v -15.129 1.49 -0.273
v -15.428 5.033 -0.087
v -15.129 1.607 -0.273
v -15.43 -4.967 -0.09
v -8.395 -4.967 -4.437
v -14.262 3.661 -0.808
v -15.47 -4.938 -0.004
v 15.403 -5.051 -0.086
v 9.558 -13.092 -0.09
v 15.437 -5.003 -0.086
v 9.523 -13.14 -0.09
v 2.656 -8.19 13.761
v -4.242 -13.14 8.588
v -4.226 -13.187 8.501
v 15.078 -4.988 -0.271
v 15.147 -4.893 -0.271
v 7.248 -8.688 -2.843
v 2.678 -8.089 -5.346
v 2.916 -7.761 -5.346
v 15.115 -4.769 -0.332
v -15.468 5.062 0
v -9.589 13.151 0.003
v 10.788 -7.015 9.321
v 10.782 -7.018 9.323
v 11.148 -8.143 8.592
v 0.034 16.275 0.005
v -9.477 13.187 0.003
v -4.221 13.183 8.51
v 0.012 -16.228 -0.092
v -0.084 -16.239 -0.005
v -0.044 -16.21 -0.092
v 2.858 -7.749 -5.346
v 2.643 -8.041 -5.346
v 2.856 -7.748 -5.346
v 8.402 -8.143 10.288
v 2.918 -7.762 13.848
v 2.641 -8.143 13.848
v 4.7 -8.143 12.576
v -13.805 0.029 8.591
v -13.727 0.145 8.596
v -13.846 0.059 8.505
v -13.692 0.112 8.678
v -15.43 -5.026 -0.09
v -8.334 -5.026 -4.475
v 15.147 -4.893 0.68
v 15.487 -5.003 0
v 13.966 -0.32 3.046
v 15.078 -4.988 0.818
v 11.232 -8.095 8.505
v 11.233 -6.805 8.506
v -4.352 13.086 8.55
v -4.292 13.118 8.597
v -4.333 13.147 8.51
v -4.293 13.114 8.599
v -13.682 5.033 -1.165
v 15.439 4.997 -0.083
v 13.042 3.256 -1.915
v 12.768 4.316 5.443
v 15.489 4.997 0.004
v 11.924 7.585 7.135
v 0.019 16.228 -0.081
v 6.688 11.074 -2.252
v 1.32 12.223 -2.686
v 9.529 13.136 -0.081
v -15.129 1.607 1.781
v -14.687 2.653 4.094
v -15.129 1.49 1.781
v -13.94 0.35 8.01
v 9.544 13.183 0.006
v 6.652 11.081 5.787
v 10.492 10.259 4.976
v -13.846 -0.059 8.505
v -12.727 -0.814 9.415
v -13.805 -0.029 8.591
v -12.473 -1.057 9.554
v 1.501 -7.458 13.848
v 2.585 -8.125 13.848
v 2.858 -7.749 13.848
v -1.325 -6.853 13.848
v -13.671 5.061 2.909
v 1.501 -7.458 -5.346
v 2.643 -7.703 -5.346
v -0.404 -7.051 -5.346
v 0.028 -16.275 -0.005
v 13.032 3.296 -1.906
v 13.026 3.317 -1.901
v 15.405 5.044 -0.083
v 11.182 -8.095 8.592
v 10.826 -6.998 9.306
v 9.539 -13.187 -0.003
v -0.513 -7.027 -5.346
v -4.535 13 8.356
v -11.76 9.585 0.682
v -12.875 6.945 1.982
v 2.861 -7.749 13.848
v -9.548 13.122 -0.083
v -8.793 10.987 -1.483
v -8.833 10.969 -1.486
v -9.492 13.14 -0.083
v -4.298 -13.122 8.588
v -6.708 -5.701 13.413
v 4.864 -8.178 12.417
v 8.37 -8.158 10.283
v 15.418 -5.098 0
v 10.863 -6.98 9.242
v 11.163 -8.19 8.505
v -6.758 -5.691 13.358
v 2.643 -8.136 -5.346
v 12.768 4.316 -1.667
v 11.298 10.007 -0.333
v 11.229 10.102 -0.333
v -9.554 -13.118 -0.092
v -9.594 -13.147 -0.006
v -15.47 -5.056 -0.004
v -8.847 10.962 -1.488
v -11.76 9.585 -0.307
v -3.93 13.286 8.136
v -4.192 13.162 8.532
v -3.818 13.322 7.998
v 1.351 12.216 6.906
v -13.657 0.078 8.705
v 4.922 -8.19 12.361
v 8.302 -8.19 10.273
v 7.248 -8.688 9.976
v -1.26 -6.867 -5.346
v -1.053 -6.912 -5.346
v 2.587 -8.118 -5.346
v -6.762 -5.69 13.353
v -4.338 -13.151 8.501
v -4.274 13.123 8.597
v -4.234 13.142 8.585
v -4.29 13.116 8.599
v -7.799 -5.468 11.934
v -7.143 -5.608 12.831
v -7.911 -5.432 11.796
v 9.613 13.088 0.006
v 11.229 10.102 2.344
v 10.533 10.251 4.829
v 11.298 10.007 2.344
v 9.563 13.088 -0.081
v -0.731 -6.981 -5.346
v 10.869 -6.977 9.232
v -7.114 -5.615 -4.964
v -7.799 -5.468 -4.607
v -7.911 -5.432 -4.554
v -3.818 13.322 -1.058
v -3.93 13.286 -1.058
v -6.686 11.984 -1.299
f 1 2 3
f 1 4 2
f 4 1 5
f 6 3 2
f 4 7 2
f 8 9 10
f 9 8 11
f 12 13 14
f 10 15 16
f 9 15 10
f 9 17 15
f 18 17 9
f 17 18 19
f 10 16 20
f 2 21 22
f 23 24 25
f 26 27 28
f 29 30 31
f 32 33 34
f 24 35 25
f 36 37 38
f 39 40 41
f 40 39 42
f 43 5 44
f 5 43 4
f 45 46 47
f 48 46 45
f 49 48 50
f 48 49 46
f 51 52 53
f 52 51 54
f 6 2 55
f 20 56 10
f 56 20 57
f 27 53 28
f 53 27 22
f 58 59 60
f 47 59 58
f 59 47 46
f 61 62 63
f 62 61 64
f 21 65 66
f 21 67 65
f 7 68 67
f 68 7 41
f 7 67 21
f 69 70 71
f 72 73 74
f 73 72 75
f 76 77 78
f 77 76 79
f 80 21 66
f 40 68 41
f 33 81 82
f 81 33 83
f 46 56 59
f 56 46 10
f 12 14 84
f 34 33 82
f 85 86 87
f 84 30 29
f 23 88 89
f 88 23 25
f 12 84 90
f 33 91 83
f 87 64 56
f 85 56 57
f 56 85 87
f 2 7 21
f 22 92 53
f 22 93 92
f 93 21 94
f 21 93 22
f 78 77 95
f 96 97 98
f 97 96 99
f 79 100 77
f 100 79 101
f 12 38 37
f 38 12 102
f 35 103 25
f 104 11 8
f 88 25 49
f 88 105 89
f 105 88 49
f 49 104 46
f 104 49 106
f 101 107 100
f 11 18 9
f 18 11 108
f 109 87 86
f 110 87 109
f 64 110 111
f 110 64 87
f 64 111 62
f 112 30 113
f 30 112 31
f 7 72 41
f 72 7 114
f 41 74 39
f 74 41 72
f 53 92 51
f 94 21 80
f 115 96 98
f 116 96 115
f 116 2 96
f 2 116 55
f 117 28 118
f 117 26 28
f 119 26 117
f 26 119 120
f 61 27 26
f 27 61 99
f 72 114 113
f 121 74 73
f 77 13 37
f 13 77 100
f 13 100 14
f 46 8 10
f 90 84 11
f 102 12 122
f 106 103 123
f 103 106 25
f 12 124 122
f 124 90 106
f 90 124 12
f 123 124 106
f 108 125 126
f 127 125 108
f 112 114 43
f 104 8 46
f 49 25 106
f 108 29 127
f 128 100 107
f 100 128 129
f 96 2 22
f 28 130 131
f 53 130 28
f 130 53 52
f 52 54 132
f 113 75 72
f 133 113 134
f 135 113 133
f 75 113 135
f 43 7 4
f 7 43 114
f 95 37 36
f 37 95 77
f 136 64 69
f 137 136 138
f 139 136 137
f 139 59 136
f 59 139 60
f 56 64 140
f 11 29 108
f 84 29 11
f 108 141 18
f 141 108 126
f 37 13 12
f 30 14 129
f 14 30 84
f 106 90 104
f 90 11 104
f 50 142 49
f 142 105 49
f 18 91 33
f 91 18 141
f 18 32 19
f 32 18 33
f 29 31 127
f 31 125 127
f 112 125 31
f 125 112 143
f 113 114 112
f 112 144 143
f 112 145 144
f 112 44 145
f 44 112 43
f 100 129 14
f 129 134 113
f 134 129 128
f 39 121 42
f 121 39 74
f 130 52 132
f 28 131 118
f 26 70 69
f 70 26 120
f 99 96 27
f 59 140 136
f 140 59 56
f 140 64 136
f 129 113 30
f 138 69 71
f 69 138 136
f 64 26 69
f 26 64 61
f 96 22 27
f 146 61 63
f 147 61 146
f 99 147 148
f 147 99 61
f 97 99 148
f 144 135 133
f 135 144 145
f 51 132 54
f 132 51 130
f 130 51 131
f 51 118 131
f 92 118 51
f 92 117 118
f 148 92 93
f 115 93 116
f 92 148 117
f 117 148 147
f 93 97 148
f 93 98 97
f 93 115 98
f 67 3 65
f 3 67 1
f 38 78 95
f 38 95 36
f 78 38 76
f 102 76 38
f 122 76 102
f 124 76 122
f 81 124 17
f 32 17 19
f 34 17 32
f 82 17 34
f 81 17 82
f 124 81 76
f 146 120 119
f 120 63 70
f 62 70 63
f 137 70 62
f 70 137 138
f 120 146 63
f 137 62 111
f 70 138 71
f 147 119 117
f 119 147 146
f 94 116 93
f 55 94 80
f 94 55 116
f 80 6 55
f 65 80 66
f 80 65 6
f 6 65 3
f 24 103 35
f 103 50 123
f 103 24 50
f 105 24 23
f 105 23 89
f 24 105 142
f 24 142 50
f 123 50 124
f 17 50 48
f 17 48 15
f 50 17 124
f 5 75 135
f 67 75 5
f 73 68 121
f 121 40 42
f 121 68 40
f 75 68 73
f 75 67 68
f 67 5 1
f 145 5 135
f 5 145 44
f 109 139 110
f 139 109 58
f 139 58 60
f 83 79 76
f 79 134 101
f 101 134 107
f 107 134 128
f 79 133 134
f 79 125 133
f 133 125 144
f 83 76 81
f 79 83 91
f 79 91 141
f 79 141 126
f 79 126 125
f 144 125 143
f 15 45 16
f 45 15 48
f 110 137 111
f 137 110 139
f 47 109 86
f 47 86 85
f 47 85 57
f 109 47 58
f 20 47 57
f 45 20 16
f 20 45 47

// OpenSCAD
// Auto-generated OpenSCAD file

    inner_points = 10*[[0.9299608274506113, -0.36625251042878015, 1.3090169944285586], [-0.9300308766981566, 0.03182392530465242, -1.3090169944285586], [1.266848278790813, 0.4315612808941218, -0.8090169942043599], [-0.38493553047389745, 1.3227137557713289, 0.5000000001356605], [-3.5024755881594054e-05, -0.16721429274351698, 1.618033988749895], [-1.5047999228086544, 0.15483630882503643, -0.5000000000867447], [1.5047298735611092, -0.48926489394916417, 0.5000000000867447], [-3.502449166371223e-05, -0.16721429238061072, -1.618033988749895], [1.2668482786587043, 0.43156128071266875, 0.809016994545535], [-0.2379166193940685, 0.753611882281222, -1.3090169942911047], [-0.9300308769119134, 0.03182392501105499, 1.3090169943213361], [-1.504799922890302, 0.15483630871289225, 0.4999999999132554], [1.5047298736427568, -0.48926489383702, -0.4999999999132554], [0.929960827664368, -0.3662525101351827, -1.3090169943213361], [1.1198293677926323, 1.0006631544963729, 2.224050943411271e-10], [0.5450603218142434, 1.12367553819821, -0.8090169941856757], [-0.23791661960782534, 0.7536118819876247, 1.3090169944587902], [-1.1679124716822094, 0.952650099854341, 3.023159500514794e-11], [0.5450603216821343, 1.123675538016757, 0.8090169945642192], [-0.38493553039224954, 1.3227137558834732, -0.4999999998643395], [-0.7830119659137325, -0.5372779485911959, 0.4999999998945711], [0.1469838862422994, -0.7363161663457679, 0.8090169943231298], [-0.7830119658320847, -0.5372779484790517, -0.500000000105429], [0.7217529323527971, -0.859328549866152, -1.86841930815973e-11], [0.14698388637440846, -0.7363161661643148, -0.8090169944267651]];

    outer_points = 10*[[0.0003389073222320645, 1.6180338602780315, 0.0005485303033235351], [-0.0003389073222320645, -1.6180338602780315, -0.0005485303033235351], [-1.376497554636943, 0.0, 0.8504636798996249], [0.8504636123728273, -0.0006447818753087883, 1.376497445343067], [0.9513306684223868, 1.3088176418818913, 0.0005730337122140106], [0.950782304855979, -1.309216138996162, -0.0003145069624228003], [-0.950782304855979, 1.309216138996162, 0.0003145069624228003], [-0.9513306684223868, -1.3088176418818913, -0.0005730337122140106], [-0.4251668862145562, 1.3088176418818913, 0.8510367136118389], [-0.42571524978096387, -1.309216138996162, 0.8501491729372022], [1.538946448725346, 0.4996775693623565, 0.00037865771973821793], [1.5387369924811702, -0.5003223512376653, 3.964734842487605e-05], [-1.5387369924811702, 0.5003223512376653, -3.964734842487605e-05], [-1.538946448725346, -0.4996775693623565, -0.00037865771973821793], [-0.688273380108343, 0.4996775693623565, 1.3764577979946422], [-0.6884828363525187, -0.5003223512376653, 1.3761187876233287], [1.1135701062666141, 0.808495290644226, 0.8510763609602638], [1.1132311989443822, -0.8095385696338055, 0.8505278306569404], [0.2628478320698681, 0.808495290644226, 1.3766918213355428], [0.26250892474763604, -0.8095385696338055, 1.3761432910322193], [0.8507222741967461, 0.0, -0.525615460375279], [0.2631064938937868, 0.8091400725195348, -0.5254210843828031], [0.26276758657155475, -0.8088937877584967, -0.5259696146861268], [-0.6880147182844242, 0.5003223512376653, -0.5256551077237038], [-0.6882241745285999, -0.4996775693623565, -0.5259941180950172]];

    // Convex hull for inner set (I)
    module inner_hull() {
        hull() {
            for (p = inner_points) {
                translate(p) sphere(r=0.1);
            }
        }
    }

    // Convex hull for outer set (O) minus inner hull (O \ I)
    module outer_minus_inner() {
        difference() {
            hull() {
                for (p = outer_points) {
                    translate(p) sphere(r=0.1);
                }
            }
            inner_hull(); // Subtract inner hull
        }
    }

    // Convex hull for outer set (O) minus all translated inner hulls
    module outer_minus_AllTranslationInner() {
        difference() {
            hull() {
                for (p = outer_points) {
                    translate(p) sphere(r=0.1);
                }
            }
            hull() {
                translate([0,0,50]) inner_hull();
                translate([0,0,-50]) inner_hull();
            }; // Subtract translated inner hulls
        }
    }

    // Difference between outer_minus_inner and outer_minus_AllTranslationInner
    module outer_minus_inner_diff() {
        difference() {
            // Outer minus inner
            difference() {
                hull() {
                    for (p = outer_points) {
                        translate(p) sphere(r=0.1);
                    }
                }
                inner_hull();
            }

            // Subtract Outer minus AllTranslationInner
            difference() {
                hull() {
                    for (p = outer_points) {
                        translate(p) sphere(r=0.1);
                    }
                }
                hull() {
                    translate([0,0,50]) inner_hull();
                    translate([0,0,-50]) inner_hull();
                };
            }
        }
    }

    // Rendering all with colors applied
    color([0, 1, 0, 1]) outer_minus_AllTranslationInner(); // Opaque green
    
